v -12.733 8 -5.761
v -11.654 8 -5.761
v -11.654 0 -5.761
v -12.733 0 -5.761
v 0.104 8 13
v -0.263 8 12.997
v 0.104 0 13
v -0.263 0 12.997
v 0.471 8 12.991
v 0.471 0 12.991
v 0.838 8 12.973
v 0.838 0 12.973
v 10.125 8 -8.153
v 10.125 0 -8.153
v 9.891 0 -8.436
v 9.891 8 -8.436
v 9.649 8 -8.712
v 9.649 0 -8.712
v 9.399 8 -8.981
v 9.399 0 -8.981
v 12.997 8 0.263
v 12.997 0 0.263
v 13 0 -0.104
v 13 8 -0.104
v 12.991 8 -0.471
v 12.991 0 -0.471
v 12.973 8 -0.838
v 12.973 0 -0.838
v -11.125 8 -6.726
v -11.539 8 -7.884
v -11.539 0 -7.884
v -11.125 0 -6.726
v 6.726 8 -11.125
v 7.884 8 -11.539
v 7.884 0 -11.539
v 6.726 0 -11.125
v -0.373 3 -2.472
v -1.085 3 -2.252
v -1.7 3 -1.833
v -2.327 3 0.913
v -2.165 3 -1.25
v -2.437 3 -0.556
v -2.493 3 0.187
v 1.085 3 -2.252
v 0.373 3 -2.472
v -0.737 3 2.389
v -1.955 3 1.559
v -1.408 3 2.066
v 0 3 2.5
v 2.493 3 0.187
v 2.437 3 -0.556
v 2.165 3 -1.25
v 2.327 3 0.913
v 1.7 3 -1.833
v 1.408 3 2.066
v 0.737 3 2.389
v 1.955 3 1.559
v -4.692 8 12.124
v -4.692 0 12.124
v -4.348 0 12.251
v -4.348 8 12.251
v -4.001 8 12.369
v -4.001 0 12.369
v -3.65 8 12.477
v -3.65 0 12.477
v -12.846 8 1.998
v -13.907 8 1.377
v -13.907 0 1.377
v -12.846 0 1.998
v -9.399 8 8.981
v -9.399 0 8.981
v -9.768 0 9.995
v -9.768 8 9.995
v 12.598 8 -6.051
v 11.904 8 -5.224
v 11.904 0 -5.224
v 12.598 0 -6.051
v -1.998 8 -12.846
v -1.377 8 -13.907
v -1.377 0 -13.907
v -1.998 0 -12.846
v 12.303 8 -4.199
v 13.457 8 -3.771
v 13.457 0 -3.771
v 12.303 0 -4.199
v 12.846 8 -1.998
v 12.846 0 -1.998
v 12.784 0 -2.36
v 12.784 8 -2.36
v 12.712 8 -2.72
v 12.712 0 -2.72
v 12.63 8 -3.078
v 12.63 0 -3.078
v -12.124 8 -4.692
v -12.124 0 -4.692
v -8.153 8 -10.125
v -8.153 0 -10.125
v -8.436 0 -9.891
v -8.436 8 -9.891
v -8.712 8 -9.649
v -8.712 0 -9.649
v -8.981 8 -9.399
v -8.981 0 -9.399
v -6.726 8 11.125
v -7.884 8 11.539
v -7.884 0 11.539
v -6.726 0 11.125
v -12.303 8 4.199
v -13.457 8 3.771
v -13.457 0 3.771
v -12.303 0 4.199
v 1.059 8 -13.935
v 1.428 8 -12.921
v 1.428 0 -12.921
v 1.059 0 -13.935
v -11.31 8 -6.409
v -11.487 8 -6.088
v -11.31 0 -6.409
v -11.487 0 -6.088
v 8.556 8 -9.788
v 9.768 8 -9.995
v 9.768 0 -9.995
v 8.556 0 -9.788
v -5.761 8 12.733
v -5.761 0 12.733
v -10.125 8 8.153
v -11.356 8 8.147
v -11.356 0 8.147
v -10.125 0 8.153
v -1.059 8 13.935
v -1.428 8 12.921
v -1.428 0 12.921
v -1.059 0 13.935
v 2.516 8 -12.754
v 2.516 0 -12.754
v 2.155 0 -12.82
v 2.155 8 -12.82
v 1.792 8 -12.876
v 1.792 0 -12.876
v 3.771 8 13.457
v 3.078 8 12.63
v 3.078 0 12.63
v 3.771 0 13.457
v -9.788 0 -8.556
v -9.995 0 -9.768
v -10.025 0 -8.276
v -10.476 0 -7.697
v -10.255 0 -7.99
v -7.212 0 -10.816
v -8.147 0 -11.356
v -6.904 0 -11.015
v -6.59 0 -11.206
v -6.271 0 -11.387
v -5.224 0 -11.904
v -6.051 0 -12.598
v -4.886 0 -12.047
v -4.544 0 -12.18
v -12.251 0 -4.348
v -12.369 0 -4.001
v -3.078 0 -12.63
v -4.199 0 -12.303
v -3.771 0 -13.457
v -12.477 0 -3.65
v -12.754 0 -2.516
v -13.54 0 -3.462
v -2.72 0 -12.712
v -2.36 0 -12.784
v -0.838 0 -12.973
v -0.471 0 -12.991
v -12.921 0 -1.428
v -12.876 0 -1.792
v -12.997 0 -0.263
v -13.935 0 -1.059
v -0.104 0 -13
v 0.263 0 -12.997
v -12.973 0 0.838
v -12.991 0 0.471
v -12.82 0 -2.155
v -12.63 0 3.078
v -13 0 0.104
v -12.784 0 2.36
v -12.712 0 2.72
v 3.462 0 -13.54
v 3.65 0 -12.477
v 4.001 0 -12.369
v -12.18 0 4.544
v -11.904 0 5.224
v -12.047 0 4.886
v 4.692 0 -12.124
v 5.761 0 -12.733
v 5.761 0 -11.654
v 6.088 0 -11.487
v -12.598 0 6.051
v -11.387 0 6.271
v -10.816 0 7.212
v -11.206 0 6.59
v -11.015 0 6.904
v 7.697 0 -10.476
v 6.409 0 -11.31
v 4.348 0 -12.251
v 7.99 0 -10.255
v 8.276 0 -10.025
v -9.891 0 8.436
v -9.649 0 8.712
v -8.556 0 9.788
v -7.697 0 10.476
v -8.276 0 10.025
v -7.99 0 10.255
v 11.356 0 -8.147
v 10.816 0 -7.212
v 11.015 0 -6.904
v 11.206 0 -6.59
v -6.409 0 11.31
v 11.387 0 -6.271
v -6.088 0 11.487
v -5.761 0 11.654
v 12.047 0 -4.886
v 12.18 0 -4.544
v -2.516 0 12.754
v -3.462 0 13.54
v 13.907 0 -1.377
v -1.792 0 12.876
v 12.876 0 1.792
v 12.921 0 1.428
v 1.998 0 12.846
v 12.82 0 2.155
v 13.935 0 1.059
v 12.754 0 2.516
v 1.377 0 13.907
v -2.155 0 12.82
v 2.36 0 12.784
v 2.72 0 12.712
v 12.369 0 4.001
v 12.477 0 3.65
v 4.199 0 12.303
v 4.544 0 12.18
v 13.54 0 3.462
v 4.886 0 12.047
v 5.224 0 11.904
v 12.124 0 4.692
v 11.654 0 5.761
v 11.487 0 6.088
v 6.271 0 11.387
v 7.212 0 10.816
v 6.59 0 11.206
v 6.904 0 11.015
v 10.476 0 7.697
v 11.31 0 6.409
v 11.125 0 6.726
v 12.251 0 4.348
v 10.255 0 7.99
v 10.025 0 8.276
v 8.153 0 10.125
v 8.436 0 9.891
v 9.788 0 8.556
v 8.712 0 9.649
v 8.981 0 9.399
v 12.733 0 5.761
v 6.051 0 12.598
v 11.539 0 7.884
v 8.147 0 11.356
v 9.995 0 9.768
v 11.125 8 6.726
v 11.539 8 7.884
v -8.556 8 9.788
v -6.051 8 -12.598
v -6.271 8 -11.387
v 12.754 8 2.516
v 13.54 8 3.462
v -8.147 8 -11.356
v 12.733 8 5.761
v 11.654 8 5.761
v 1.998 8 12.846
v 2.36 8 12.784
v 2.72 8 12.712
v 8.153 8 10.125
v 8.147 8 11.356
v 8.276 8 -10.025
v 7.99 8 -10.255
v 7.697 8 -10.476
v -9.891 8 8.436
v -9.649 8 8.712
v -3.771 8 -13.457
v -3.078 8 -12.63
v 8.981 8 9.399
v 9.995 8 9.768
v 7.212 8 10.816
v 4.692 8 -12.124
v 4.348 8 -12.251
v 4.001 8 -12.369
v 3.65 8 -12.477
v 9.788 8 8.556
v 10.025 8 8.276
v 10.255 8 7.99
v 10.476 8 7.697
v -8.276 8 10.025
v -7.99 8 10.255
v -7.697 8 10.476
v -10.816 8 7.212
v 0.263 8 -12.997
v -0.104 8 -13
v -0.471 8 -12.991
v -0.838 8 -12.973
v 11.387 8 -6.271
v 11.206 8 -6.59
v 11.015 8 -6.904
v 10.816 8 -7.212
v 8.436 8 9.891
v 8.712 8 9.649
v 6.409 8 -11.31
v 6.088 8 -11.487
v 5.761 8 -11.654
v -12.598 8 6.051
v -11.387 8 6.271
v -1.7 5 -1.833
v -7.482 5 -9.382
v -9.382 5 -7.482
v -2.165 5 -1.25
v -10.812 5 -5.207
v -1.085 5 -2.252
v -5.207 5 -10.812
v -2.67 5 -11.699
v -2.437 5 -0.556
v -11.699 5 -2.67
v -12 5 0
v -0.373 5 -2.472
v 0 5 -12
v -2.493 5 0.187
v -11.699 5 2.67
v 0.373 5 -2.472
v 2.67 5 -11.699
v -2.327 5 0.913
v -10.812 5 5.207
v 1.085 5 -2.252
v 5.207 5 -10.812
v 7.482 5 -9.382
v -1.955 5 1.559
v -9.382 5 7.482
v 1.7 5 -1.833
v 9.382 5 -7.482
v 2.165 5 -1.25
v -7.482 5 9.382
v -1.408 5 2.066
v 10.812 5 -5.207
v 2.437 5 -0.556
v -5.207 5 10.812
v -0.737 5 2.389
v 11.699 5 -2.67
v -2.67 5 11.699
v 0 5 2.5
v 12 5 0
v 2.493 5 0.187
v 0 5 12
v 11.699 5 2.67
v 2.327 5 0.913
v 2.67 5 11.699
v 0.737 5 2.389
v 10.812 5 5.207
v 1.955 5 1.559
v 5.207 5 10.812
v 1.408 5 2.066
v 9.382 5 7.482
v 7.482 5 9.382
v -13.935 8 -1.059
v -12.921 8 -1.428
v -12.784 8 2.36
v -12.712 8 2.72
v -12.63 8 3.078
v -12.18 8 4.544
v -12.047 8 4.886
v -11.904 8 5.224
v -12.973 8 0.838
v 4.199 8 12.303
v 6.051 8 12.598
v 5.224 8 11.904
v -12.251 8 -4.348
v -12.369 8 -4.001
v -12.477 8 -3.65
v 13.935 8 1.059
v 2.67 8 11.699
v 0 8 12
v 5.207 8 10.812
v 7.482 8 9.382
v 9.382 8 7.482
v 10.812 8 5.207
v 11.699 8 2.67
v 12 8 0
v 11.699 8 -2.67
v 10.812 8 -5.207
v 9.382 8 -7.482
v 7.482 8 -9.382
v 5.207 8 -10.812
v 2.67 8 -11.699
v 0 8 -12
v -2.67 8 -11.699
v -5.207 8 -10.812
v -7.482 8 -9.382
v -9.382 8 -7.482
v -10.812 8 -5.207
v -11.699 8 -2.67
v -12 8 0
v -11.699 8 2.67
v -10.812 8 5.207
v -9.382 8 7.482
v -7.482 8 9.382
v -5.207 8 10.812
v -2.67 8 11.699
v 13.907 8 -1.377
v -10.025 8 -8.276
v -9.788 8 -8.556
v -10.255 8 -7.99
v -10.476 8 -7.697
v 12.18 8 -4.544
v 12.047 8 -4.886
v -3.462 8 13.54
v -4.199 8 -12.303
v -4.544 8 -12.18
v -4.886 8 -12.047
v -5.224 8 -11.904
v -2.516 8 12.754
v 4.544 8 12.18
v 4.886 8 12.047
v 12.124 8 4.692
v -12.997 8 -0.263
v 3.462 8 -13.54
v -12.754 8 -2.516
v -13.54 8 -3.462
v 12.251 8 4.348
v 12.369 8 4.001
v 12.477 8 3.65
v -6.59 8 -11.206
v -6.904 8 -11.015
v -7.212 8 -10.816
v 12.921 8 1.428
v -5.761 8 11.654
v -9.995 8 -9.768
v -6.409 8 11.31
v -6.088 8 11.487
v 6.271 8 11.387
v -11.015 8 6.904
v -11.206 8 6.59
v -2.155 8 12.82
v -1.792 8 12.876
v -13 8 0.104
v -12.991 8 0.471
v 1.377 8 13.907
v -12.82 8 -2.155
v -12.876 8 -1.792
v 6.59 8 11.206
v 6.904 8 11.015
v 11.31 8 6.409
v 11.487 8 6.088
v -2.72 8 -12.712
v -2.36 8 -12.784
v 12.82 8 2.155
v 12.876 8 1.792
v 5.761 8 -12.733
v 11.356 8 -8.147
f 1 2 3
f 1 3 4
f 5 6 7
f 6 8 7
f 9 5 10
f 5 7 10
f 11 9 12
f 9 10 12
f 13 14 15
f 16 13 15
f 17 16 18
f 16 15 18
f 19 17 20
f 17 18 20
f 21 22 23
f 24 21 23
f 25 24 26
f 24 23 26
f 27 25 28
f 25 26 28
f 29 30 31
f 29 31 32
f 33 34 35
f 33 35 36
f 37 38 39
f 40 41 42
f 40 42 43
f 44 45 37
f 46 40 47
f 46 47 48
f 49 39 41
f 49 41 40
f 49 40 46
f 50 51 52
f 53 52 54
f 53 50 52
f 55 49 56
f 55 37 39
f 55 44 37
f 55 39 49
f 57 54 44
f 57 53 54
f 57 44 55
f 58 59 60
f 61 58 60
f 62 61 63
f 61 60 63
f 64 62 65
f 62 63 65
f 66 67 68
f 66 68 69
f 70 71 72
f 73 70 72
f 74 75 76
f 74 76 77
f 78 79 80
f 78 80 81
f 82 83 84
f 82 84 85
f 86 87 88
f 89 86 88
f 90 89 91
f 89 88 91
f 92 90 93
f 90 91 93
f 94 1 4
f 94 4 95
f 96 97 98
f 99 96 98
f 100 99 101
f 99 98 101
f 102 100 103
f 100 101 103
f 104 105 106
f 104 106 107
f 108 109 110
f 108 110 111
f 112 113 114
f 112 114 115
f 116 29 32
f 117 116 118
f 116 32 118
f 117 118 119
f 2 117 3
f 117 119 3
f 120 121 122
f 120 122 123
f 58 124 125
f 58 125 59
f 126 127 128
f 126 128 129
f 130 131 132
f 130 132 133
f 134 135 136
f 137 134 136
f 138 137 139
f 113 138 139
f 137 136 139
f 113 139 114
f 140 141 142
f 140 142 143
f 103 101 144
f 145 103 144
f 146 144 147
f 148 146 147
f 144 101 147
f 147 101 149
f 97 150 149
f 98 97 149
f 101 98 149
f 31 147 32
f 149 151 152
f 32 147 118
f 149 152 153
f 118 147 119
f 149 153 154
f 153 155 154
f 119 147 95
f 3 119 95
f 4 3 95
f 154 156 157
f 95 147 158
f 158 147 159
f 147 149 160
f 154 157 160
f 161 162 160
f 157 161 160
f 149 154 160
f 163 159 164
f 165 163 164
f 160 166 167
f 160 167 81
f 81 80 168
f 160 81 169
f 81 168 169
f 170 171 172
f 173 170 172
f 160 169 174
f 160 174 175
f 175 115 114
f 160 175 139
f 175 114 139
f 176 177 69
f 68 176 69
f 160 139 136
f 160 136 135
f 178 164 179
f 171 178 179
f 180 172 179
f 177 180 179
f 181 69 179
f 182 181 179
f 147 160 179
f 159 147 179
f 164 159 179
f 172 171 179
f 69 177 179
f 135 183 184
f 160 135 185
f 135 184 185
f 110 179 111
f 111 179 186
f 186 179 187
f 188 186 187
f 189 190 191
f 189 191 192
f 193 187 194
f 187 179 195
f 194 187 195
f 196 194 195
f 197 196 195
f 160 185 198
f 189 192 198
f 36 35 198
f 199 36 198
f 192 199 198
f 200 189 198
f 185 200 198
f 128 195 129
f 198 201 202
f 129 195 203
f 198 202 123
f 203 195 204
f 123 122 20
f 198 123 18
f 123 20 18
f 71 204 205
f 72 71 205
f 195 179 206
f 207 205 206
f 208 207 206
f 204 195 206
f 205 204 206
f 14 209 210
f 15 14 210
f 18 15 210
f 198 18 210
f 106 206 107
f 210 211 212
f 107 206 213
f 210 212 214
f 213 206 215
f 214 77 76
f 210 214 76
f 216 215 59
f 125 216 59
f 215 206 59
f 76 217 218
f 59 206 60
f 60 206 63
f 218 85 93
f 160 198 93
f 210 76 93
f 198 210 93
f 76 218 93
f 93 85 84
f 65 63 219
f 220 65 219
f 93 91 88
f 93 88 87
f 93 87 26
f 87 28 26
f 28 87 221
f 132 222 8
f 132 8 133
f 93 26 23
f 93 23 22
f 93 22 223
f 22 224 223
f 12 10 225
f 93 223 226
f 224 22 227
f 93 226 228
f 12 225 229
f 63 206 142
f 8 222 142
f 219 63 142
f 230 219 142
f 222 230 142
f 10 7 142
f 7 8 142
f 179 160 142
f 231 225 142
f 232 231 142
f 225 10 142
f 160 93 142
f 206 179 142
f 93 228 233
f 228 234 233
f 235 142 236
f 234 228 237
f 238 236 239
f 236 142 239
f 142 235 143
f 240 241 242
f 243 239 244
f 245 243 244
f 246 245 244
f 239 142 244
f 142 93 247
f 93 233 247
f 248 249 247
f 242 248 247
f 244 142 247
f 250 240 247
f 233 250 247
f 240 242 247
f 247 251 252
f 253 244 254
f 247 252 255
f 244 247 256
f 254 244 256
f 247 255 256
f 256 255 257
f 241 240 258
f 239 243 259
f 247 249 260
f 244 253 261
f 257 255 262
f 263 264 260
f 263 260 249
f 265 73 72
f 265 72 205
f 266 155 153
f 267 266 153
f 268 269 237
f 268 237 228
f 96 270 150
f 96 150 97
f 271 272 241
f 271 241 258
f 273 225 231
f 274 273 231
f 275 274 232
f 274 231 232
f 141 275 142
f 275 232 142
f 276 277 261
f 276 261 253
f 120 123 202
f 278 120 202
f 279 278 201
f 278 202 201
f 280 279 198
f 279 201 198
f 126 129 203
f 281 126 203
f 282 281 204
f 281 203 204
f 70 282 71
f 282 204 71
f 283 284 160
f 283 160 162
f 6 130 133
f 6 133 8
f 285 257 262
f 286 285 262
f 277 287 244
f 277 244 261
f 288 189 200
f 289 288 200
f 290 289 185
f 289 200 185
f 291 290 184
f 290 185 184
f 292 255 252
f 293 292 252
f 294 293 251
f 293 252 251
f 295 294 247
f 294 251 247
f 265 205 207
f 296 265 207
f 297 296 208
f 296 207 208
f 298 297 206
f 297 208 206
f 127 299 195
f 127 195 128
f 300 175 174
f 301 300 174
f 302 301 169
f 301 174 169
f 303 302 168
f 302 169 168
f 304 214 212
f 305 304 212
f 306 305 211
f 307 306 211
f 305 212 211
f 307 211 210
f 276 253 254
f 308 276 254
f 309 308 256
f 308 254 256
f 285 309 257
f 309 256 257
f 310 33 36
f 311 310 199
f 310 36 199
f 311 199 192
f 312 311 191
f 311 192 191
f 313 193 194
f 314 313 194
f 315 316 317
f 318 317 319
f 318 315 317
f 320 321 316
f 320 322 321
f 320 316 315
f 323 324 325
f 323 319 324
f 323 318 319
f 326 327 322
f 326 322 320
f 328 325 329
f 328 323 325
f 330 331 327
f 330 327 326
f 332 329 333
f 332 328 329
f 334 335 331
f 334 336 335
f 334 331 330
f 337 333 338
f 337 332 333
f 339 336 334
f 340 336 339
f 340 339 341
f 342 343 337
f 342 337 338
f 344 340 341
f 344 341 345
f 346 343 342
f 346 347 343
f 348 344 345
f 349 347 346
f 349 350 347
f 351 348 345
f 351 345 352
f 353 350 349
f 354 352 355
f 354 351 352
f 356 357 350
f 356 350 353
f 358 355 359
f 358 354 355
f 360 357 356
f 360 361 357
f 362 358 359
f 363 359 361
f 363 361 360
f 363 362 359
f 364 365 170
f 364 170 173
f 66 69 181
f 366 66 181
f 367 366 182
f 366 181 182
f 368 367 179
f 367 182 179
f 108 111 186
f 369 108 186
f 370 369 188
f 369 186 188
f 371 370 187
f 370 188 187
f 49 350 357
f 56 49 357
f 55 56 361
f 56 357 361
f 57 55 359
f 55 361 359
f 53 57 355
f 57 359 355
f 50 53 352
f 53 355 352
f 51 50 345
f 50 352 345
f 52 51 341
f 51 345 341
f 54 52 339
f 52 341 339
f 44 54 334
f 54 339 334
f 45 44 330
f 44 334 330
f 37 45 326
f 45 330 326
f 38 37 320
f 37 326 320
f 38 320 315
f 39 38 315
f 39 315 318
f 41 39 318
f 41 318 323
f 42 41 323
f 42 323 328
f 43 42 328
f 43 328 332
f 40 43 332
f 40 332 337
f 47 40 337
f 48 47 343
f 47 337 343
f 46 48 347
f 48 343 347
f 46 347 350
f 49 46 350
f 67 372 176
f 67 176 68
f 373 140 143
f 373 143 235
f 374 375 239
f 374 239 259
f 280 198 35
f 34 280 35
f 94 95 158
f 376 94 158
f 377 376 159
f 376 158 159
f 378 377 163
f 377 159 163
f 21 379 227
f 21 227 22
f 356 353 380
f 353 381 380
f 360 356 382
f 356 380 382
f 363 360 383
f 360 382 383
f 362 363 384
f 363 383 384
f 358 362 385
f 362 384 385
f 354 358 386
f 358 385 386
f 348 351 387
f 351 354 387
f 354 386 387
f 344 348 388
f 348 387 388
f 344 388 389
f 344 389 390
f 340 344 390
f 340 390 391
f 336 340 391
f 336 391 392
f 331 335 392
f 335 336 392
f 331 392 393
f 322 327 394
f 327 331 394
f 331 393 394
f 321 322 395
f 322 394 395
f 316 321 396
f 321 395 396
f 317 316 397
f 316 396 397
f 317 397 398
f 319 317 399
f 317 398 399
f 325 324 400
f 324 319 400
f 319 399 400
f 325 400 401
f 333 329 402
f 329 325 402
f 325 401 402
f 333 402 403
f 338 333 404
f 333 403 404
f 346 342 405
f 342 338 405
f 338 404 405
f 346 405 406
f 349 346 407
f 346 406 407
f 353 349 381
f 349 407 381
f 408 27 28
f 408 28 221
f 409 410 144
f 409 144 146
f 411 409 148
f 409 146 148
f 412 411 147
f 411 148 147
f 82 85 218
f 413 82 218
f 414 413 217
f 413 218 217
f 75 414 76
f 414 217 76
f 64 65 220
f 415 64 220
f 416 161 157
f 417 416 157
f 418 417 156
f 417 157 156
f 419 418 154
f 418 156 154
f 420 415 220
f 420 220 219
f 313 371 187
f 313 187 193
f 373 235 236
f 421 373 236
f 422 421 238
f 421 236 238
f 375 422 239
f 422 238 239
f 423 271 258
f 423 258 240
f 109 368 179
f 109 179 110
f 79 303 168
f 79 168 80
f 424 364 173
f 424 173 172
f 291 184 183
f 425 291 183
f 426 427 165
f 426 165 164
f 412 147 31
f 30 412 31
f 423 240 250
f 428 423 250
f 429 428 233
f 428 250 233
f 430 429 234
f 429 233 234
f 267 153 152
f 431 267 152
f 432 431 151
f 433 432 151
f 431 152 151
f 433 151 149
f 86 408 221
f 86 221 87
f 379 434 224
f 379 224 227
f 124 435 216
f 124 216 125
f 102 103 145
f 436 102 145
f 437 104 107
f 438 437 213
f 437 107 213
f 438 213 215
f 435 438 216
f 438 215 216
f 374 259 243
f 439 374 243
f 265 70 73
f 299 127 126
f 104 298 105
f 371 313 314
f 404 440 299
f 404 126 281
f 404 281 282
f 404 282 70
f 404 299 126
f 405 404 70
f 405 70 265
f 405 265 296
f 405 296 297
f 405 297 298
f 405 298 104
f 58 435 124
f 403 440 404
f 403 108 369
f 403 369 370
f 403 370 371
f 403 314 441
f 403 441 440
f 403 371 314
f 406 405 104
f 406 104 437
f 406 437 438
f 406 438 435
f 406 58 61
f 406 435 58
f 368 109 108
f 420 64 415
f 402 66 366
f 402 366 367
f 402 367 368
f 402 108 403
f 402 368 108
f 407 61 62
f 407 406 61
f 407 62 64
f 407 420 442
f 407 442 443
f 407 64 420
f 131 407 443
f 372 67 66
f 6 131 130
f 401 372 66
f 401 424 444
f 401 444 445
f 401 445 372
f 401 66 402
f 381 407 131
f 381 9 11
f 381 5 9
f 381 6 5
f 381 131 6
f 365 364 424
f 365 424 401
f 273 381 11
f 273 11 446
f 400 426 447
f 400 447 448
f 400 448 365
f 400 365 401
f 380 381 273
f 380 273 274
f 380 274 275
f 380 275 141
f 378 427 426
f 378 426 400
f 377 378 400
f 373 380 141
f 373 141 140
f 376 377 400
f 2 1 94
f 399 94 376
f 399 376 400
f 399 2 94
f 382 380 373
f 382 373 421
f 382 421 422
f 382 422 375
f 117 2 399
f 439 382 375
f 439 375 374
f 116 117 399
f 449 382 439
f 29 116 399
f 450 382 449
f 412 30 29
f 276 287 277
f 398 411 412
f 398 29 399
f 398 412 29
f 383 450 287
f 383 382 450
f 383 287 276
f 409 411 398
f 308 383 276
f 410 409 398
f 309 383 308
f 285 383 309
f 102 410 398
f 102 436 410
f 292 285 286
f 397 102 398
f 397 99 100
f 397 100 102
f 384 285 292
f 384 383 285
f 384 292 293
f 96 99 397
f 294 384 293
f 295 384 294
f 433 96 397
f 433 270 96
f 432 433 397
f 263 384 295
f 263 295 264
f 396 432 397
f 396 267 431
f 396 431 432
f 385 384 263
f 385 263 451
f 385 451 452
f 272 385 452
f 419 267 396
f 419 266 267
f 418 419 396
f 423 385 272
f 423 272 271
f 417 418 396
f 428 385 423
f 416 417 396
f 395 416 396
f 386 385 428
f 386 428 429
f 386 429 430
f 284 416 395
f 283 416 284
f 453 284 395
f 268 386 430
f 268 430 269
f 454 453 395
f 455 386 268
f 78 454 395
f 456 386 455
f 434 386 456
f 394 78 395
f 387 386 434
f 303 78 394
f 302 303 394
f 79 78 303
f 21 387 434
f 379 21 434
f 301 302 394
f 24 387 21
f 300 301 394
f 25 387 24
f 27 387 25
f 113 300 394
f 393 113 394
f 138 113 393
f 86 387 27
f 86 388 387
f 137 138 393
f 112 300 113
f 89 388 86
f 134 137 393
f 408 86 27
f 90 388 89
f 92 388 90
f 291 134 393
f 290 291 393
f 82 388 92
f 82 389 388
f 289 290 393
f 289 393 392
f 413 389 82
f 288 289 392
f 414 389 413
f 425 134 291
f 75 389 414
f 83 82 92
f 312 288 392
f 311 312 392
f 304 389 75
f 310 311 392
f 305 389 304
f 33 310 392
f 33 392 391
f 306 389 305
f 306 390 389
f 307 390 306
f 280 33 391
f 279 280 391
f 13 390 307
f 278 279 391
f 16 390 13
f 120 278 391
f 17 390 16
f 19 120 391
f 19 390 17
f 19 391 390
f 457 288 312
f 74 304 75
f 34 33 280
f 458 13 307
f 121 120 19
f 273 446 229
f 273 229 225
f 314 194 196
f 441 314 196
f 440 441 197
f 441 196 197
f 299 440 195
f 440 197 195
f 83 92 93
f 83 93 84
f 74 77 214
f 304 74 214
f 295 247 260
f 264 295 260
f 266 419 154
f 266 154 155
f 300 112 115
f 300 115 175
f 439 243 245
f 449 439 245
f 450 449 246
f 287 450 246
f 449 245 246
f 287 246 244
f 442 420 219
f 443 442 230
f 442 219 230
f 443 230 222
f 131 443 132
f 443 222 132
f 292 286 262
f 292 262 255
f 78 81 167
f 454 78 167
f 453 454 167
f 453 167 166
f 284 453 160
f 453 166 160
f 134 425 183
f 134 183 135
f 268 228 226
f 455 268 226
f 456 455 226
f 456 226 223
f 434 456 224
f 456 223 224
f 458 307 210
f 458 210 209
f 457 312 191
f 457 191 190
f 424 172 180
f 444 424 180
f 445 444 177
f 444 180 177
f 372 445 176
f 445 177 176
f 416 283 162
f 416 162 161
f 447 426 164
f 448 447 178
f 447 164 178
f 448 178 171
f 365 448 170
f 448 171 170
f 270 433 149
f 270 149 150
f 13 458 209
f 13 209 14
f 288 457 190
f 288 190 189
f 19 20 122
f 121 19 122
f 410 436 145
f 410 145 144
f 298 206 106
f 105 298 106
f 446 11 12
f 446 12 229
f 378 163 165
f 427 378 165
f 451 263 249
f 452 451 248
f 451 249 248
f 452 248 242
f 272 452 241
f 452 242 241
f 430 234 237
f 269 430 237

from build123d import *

# Parameters (mm, degrees)
SKETCH_1_R          = 13
EXTRUDE_1_DEPTH     = 8
SKETCH_2_R          = 12
CUT_EXTRUDE_1_DEPTH = 3
EXTRUDE_2_DEPTH     = 8
SKETCH_4_R          = 2.5
CUT_EXTRUDE_2_DEPTH = 2


with BuildPart() as part:
    # 草图1 → 凸台-拉伸1 (new body)
    with BuildSketch(Plane(origin=(0, 0, 0), x_dir=(1, 0, 0), z_dir=(0, 1, 0))):
        with Locations(Location((0, 0, 0), (0, 0, 270))):
            Circle(SKETCH_1_R)
    extrude(amount=EXTRUDE_1_DEPTH)

    # 草图2 → 切除-拉伸1 (cut)
    with BuildSketch(Plane(origin=(0, 8, 0), x_dir=(1, 0, 0), z_dir=(0, 1, 0))):
        with Locations(Location((0, 0, 0), (0, 0, 270))):
            Circle(SKETCH_2_R)
    extrude(amount=-CUT_EXTRUDE_1_DEPTH, mode=Mode.SUBTRACT)

    # 草图3 → 凸台-拉伸2 (add, through all)
    with BuildSketch(Plane(origin=(0, 8, 0), x_dir=(1, 0, 0), z_dir=(0, 1, 0))):
        Polygon((-12.123665589, 4.692199131), (-11.044603538, 4.692199131), (-11.653830585, 5.760922904), (-12.732892635, 5.760922904), align=None)
        Polygon((-11.124688039, 6.726166519), (-10.062019365, 6.53878936), (-10.476408948, 7.697067984), (-11.539077622, 7.884445143), align=None)
        Polygon((-9.787692472, 8.555762741), (-8.773705825, 8.186701784), (-8.980666927, 9.399341549), (-9.994653573, 9.768402506), align=None)
        Polygon((-8.153302822, 10.125396442), (-7.218807673, 9.585865416), (-7.212051886, 10.816020876), (-8.146547034, 11.355551902), align=None)
        Polygon((-6.271179191, 11.387375095), (-5.444569703, 10.693767379), (-5.224302297, 11.904060883), (-6.050911785, 12.597668599), align=None)
        Polygon((-4.198508954, 12.303354118), (-3.504901238, 11.47674463), (-3.077814927, 12.630402023), (-3.771422644, 13.457011511), align=None)
        Polygon((-1.998269147, 12.845501953), (-1.458738122, 11.911006804), (-0.837809708, 12.97297479), (-1.377340734, 13.907469938), align=None)
        Polygon((0.262687056, 12.99734571), (0.631748014, 11.983359064), (1.427651935, 12.921370282), (1.058590978, 13.935356928), align=None)
        Polygon((2.515661647, 12.754271695), (2.703038805, 11.691603022), (3.649735097, 12.477156476), (3.462357938, 13.53982515), align=None)
        Polygon((4.692199131, 12.123665589), (4.692199131, 11.044603538), (5.760922904, 11.653830585), (5.760922904, 12.732892635), align=None)
        Polygon((6.726166519, 11.124688039), (6.53878936, 10.062019365), (7.697067984, 10.476408948), (7.884445143, 11.539077622), align=None)
        Polygon((8.555762741, 9.787692472), (8.186701784, 8.773705825), (9.399341549, 8.980666927), (9.768402506, 9.994653573), align=None)
        Polygon((10.125396442, 8.153302822), (9.585865416, 7.218807673), (10.816020876, 7.212051886), (11.355551902, 8.146547034), align=None)
        Polygon((11.387375095, 6.271179191), (10.693767379, 5.444569703), (11.904060883, 5.224302297), (12.597668599, 6.050911785), align=None)
        Polygon((12.303354118, 4.198508954), (11.47674463, 3.504901238), (12.630402023, 3.077814927), (13.457011511, 3.771422644), align=None)
        Polygon((12.845501953, 1.998269147), (11.911006804, 1.458738122), (12.97297479, 0.837809708), (13.907469938, 1.377340734), align=None)
        Polygon((12.99734571, -0.262687056), (11.983359064, -0.631748014), (12.921370282, -1.427651935), (13.935356928, -1.058590978), align=None)
        Polygon((12.754271695, -2.515661647), (11.691603022, -2.703038805), (12.477156476, -3.649735097), (13.53982515, -3.462357938), align=None)
        Polygon((12.123665589, -4.692199131), (11.044603538, -4.692199131), (11.653830585, -5.760922904), (12.732892635, -5.760922904), align=None)
        Polygon((11.124688039, -6.726166519), (10.062019365, -6.53878936), (10.476408948, -7.697067984), (11.539077622, -7.884445143), align=None)
        Polygon((9.787692472, -8.555762741), (8.773705825, -8.186701784), (8.980666927, -9.399341549), (9.994653573, -9.768402506), align=None)
        Polygon((8.153302822, -10.125396442), (7.218807673, -9.585865416), (7.212051886, -10.816020876), (8.146547034, -11.355551902), align=None)
        Polygon((6.271179191, -11.387375095), (5.444569703, -10.693767379), (5.224302297, -11.904060883), (6.050911785, -12.597668599), align=None)
        Polygon((4.198508954, -12.303354118), (3.504901238, -11.47674463), (3.077814927, -12.630402023), (3.771422644, -13.457011511), align=None)
        Polygon((1.998269147, -12.845501953), (1.458738122, -11.911006804), (0.837809708, -12.97297479), (1.377340734, -13.907469938), align=None)
        Polygon((-0.262687056, -12.99734571), (-0.631748014, -11.983359064), (-1.427651935, -12.921370282), (-1.058590978, -13.935356928), align=None)
        Polygon((-2.515661647, -12.754271695), (-2.703038805, -11.691603022), (-3.649735097, -12.477156476), (-3.462357938, -13.53982515), align=None)
        Polygon((-4.692199131, -12.123665589), (-4.692199131, -11.044603538), (-5.760922904, -11.653830585), (-5.760922904, -12.732892635), align=None)
        Polygon((-6.726166519, -11.124688039), (-6.53878936, -10.062019365), (-7.697067984, -10.476408948), (-7.884445143, -11.539077622), align=None)
        Polygon((-8.555762741, -9.787692472), (-8.186701784, -8.773705825), (-9.399341549, -8.980666927), (-9.768402506, -9.994653573), align=None)
        Polygon((-10.125396442, -8.153302822), (-9.585865416, -7.218807673), (-10.816020876, -7.212051886), (-11.355551902, -8.146547034), align=None)
        Polygon((-11.387375095, -6.271179191), (-10.693767379, -5.444569703), (-11.904060883, -5.224302297), (-12.597668599, -6.050911785), align=None)
        Polygon((-12.303354118, -4.198508954), (-11.47674463, -3.504901238), (-12.630402023, -3.077814927), (-13.457011511, -3.771422644), align=None)
        Polygon((-12.845501953, -1.998269147), (-11.911006804, -1.458738122), (-12.97297479, -0.837809708), (-13.907469938, -1.377340734), align=None)
        Polygon((-12.99734571, 0.262687056), (-11.983359064, 0.631748014), (-12.921370282, 1.427651935), (-13.935356928, 1.058590978), align=None)
        Polygon((-12.754271695, 2.515661647), (-11.691603022, 2.703038805), (-12.477156476, 3.649735097), (-13.53982515, 3.462357938), align=None)
    extrude(amount=-EXTRUDE_2_DEPTH)

    # 草图4 → 切除-拉伸2 (cut)
    with BuildSketch(Plane(origin=(0, 5, 0), x_dir=(1, 0, 0), z_dir=(0, 1, 0))):
        with Locations(Location((0, 0, 0), (0, 0, 270))):
            Circle(SKETCH_4_R)
    extrude(amount=-CUT_EXTRUDE_2_DEPTH, mode=Mode.SUBTRACT)


solid = part.part
